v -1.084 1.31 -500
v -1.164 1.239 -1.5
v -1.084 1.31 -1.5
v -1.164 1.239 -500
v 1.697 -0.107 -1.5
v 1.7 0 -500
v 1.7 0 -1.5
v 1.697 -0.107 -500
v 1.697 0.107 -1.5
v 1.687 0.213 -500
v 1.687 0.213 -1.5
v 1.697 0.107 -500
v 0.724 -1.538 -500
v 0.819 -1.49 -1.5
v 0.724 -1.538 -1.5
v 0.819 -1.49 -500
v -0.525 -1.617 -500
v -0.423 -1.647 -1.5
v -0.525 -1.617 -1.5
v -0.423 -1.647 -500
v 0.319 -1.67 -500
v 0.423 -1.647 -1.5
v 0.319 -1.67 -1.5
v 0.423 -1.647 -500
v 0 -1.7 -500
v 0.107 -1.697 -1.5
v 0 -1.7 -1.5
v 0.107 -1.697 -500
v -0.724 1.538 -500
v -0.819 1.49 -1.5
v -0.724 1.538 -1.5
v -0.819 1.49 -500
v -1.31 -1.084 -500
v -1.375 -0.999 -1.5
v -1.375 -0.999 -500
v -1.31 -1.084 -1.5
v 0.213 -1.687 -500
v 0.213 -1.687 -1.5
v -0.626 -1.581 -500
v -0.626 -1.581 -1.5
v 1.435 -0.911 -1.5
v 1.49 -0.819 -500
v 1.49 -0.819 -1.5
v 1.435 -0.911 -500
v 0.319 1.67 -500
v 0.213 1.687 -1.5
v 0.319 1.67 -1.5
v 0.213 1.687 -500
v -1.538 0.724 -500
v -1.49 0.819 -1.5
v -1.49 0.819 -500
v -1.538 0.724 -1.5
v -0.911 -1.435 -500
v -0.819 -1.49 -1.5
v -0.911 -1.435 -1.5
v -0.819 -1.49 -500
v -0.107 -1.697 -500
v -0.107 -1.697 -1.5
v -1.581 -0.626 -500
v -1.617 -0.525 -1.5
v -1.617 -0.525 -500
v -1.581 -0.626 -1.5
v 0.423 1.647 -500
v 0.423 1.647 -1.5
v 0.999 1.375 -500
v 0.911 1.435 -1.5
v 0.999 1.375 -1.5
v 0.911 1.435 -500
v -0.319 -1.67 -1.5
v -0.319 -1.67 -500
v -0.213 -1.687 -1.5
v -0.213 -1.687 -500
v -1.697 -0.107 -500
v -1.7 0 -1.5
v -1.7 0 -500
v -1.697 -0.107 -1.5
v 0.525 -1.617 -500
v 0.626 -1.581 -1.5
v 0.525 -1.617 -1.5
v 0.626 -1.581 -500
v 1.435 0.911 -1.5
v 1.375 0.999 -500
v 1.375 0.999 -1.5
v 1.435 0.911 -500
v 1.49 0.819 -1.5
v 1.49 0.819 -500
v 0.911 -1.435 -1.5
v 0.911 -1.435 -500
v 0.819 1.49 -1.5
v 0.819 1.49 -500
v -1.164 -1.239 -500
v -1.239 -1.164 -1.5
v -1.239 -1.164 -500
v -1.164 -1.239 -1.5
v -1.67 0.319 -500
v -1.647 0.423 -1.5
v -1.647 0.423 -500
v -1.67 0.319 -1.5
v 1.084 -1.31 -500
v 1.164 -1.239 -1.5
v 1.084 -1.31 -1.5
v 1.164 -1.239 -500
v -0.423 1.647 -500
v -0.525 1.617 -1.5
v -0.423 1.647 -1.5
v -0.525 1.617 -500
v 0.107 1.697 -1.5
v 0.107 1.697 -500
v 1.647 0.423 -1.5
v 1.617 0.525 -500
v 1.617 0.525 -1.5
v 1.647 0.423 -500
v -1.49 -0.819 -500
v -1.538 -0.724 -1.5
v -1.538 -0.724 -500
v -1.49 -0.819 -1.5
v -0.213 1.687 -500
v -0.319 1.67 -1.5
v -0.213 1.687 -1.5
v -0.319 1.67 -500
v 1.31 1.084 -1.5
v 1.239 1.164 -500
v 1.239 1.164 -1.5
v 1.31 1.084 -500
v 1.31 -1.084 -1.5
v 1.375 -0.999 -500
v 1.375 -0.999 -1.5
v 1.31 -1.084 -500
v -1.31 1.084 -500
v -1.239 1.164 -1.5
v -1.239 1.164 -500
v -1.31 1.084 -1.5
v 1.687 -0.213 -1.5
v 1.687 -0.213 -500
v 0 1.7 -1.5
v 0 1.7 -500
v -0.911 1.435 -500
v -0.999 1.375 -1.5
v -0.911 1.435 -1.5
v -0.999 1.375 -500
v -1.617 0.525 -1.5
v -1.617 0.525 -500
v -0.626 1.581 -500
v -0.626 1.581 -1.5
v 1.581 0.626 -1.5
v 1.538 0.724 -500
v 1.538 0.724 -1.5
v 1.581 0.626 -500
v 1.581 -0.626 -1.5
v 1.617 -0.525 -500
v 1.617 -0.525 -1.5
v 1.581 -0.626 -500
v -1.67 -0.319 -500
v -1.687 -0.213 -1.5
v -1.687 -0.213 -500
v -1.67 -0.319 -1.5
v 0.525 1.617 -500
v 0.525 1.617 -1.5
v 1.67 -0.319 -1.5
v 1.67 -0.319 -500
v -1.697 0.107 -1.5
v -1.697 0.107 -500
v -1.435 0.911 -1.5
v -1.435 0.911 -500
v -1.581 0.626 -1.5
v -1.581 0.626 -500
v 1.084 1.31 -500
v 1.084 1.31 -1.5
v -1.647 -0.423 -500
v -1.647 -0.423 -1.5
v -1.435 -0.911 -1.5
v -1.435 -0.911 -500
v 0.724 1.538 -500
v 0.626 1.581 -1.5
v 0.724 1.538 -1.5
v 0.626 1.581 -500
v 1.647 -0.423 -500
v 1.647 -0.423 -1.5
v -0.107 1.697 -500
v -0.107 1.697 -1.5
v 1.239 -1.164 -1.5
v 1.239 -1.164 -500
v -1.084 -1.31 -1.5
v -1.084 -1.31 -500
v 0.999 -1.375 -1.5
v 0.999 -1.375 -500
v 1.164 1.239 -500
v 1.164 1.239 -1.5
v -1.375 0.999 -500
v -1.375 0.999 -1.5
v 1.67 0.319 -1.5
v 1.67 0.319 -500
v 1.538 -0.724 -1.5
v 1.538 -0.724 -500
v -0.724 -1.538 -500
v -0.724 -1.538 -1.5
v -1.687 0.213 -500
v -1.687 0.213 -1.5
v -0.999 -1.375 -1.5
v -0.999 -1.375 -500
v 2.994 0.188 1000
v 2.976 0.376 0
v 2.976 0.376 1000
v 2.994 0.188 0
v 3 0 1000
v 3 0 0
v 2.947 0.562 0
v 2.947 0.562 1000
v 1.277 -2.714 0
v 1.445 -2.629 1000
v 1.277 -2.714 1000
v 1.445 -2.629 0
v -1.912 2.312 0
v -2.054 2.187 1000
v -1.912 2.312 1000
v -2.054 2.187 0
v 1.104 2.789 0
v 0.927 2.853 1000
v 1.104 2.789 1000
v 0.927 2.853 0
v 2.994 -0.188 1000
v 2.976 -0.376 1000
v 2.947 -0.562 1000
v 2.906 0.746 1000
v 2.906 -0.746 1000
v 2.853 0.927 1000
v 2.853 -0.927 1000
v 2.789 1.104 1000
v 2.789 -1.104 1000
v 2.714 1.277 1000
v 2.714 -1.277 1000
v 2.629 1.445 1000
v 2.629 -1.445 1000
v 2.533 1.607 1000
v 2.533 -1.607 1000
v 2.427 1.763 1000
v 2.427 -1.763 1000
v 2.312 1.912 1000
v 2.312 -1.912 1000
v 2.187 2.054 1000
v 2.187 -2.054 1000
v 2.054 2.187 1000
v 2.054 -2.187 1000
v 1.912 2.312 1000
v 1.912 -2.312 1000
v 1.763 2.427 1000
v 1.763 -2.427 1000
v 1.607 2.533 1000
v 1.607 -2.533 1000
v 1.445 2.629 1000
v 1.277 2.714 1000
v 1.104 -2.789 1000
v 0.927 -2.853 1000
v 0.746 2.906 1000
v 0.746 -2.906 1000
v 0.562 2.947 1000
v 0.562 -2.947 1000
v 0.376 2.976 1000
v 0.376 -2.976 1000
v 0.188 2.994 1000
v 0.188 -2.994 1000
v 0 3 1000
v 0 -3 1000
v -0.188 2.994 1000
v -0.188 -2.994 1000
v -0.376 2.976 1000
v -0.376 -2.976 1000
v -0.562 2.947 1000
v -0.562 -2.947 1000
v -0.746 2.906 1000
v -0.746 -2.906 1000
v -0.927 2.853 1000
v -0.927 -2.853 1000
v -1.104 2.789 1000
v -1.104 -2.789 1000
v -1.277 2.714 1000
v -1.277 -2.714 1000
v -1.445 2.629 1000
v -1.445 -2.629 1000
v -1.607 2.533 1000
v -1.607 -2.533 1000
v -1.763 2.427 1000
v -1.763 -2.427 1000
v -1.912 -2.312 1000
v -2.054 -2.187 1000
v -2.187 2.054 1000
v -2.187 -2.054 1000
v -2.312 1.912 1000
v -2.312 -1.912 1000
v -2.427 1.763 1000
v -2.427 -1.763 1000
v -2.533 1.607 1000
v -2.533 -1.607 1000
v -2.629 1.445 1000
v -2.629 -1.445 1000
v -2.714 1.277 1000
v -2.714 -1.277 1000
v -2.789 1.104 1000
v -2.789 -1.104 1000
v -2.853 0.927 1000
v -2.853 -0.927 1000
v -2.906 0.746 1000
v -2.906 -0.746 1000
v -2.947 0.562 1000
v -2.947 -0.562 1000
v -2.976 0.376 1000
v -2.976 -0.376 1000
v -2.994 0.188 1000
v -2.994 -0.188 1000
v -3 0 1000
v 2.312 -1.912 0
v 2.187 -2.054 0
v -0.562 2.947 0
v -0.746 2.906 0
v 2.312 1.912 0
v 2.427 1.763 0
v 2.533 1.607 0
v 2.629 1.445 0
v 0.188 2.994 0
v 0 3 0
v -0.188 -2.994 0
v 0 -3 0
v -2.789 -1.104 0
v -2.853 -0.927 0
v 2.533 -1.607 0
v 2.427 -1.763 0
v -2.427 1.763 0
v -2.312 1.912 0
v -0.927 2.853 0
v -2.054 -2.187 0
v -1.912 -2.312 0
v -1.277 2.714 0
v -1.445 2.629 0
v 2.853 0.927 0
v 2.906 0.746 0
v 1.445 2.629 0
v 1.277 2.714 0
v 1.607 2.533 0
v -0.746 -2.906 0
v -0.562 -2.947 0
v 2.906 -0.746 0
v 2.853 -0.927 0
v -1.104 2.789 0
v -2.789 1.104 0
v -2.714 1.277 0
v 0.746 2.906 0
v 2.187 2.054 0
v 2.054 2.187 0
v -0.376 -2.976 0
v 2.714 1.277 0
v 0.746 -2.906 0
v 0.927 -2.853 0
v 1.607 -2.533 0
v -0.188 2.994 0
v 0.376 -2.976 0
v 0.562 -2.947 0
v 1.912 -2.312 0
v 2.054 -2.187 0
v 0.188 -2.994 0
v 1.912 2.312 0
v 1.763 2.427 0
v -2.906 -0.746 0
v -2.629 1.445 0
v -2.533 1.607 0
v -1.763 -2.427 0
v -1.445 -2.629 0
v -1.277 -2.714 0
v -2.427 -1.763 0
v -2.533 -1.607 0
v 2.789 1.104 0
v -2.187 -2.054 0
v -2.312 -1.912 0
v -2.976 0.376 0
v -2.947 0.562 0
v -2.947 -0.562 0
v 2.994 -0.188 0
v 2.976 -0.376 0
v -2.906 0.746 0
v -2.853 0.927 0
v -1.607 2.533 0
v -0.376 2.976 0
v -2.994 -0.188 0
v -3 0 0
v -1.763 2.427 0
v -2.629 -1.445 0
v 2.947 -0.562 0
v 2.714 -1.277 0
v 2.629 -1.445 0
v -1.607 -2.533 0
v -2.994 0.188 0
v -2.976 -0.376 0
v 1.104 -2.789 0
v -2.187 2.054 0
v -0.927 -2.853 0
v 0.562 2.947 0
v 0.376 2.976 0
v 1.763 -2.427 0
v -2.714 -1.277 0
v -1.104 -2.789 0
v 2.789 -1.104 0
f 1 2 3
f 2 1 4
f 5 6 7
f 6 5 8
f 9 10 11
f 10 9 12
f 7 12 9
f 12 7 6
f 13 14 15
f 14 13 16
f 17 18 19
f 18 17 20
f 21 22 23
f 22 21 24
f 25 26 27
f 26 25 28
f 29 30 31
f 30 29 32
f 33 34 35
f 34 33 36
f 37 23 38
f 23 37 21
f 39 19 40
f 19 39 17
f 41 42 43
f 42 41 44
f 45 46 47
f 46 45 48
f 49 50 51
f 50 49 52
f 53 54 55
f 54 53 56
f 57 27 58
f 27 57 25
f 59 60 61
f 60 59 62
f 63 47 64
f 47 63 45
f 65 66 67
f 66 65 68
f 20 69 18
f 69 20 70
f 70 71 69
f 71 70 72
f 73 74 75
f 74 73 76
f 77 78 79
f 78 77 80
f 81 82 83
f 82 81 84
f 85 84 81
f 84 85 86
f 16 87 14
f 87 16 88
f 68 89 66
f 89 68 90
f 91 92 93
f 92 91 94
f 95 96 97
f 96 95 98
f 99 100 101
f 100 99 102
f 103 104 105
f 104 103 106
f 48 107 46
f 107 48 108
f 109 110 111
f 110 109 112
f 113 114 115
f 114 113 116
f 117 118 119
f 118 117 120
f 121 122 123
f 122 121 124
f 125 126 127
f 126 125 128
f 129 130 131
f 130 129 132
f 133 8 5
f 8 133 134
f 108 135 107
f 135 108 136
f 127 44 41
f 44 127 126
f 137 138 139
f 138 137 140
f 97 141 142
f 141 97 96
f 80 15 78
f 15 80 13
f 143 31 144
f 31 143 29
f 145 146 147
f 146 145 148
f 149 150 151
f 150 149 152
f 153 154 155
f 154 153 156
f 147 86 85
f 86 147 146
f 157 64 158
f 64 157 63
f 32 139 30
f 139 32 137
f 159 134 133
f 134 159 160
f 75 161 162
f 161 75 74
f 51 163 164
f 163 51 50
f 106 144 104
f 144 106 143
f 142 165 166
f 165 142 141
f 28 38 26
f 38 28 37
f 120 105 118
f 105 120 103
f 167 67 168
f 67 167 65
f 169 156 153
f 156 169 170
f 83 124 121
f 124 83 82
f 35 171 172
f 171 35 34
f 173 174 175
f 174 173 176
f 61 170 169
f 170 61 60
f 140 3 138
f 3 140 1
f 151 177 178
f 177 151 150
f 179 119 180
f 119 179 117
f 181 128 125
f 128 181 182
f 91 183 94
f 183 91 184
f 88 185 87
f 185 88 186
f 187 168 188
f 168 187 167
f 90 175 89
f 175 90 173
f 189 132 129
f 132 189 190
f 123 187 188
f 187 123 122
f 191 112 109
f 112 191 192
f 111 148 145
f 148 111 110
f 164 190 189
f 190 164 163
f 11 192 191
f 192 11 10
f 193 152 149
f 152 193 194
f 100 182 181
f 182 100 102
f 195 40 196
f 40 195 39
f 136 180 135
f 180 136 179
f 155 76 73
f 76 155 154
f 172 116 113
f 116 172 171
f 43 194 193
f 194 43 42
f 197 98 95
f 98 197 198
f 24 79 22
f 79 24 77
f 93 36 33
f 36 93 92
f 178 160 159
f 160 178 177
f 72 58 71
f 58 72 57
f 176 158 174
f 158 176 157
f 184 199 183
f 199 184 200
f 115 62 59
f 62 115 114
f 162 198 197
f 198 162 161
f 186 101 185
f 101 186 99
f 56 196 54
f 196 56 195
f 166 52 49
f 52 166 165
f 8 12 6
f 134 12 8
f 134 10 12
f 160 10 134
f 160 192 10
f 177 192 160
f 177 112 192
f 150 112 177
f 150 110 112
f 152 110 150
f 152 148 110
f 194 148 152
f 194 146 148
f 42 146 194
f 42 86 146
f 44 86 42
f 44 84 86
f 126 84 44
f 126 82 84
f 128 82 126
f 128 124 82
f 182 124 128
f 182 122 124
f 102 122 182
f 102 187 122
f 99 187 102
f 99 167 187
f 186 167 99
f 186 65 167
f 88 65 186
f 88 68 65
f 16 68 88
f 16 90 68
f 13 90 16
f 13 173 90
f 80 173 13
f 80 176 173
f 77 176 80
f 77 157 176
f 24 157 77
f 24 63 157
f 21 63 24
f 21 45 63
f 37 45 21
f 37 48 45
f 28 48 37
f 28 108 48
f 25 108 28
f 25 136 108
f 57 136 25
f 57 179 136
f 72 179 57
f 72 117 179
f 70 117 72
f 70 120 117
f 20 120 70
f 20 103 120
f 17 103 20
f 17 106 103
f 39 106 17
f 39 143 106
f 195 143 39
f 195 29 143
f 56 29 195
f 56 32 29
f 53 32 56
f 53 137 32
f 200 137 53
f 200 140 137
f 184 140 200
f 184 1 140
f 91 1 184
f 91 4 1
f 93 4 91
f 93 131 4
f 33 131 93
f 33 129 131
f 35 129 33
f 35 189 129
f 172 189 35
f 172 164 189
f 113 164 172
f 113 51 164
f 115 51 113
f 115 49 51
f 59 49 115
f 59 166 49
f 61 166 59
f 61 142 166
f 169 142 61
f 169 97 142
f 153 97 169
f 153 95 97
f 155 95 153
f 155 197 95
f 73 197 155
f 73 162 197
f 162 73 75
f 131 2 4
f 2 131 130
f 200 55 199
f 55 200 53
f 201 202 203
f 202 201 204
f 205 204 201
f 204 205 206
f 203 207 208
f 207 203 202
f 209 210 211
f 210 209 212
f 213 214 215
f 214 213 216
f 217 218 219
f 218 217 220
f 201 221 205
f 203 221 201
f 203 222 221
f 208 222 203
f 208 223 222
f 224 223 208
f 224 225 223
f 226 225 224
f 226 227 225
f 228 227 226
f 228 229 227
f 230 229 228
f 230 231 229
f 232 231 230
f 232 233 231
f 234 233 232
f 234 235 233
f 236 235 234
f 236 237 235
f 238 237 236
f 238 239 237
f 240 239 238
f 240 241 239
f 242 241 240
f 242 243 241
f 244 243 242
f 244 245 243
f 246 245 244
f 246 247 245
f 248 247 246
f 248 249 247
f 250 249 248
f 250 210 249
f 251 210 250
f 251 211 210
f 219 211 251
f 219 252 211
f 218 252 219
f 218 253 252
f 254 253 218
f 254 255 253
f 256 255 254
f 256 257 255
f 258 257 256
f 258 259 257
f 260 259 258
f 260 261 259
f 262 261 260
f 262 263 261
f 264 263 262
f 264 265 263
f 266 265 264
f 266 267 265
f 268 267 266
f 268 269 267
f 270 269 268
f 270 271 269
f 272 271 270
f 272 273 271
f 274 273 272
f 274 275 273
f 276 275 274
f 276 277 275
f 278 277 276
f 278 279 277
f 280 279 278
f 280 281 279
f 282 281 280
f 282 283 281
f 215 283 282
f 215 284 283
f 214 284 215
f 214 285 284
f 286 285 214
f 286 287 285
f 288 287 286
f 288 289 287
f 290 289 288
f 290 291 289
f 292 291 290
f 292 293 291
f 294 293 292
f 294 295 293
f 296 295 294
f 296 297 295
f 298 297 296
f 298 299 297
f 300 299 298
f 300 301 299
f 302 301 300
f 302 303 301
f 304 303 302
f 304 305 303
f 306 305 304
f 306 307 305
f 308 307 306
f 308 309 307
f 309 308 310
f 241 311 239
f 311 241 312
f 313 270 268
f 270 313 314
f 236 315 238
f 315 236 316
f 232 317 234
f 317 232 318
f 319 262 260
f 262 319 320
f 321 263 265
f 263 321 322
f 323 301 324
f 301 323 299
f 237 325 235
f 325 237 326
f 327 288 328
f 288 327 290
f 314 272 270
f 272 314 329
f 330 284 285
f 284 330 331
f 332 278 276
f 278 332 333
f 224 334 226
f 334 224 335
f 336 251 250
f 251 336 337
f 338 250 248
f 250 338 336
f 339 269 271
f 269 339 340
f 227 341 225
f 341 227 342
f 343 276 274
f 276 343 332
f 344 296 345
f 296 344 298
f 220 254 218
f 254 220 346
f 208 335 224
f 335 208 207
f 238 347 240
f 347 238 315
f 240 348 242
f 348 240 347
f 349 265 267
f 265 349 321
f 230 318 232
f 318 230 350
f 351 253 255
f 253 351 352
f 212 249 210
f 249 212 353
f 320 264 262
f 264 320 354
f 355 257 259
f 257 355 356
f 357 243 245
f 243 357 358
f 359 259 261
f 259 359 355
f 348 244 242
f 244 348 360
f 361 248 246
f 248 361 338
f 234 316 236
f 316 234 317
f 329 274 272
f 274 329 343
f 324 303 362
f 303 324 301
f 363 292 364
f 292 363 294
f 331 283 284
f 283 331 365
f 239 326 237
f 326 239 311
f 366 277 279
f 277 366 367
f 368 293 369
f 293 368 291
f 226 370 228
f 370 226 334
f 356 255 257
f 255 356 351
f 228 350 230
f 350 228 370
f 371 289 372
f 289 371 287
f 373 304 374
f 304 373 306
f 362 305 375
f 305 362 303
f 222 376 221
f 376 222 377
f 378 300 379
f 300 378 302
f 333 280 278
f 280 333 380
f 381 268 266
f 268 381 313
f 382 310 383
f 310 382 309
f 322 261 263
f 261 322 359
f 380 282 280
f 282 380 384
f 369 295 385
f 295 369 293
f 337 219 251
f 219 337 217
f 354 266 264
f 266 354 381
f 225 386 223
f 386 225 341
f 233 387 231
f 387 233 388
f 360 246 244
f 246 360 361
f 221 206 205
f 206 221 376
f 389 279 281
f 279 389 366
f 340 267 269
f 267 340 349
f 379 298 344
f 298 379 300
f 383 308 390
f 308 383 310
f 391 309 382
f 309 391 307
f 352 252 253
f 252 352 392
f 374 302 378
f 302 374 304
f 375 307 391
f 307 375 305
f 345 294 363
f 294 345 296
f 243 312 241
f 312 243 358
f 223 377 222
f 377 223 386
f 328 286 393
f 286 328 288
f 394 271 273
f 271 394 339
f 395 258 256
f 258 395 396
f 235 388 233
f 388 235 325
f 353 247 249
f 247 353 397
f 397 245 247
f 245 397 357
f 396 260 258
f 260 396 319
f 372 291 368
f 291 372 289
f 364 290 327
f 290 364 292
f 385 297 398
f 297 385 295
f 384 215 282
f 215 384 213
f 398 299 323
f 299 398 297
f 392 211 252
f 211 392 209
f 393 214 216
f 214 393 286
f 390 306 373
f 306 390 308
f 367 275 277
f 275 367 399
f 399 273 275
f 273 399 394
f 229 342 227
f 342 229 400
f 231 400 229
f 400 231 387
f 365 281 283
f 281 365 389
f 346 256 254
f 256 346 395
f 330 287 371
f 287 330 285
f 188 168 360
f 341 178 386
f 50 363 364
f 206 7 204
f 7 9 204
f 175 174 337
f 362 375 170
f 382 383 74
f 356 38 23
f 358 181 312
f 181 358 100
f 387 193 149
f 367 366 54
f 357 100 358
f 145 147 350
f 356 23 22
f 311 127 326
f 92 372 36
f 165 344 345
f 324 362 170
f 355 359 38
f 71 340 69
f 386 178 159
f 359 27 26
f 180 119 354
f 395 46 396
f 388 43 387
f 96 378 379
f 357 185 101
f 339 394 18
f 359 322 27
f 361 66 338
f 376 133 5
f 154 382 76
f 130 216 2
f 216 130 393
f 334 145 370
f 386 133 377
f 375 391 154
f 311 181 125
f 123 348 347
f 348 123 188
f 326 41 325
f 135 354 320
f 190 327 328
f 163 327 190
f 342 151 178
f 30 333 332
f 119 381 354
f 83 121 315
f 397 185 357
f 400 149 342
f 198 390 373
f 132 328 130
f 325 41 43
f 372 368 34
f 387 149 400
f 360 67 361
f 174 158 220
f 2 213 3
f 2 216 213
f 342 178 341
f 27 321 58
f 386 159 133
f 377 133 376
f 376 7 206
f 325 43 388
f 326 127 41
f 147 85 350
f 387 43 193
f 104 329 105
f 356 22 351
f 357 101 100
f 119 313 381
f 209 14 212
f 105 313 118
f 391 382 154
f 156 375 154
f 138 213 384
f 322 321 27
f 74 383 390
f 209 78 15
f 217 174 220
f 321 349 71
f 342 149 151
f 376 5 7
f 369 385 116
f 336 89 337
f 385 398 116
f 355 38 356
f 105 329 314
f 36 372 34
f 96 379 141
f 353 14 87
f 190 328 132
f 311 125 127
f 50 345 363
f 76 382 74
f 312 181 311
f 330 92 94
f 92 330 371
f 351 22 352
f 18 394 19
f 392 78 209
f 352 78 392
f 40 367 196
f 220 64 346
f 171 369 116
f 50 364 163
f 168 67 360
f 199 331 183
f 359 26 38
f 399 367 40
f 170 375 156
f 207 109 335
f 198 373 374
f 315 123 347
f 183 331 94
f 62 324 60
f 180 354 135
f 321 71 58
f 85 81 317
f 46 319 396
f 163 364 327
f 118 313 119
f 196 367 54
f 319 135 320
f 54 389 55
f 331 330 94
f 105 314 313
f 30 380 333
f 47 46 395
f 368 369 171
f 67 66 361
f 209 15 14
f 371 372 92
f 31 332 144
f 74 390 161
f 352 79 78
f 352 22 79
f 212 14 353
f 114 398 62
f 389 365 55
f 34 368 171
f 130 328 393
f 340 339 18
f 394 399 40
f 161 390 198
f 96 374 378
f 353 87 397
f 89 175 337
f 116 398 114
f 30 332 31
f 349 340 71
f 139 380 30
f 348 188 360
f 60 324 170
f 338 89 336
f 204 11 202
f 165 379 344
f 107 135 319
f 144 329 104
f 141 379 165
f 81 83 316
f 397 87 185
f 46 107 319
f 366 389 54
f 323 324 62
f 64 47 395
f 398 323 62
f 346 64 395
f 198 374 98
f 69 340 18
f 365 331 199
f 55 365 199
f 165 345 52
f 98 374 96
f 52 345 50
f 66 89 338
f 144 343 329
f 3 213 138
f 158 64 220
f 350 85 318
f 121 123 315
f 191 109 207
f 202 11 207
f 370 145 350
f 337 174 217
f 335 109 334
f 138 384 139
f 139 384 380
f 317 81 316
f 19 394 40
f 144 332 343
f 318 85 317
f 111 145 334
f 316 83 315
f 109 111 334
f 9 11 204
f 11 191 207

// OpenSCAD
module SchlitzschraubenNegativ(innerDiameter = 3.4, outerDiameter = 6) {
    // Nullpunkt ist am Übergang von Gewinde zu Kopf
    cylinder(h=1000, d=innerDiameter, center=true);
    cylinder(h=1000, d=outerDiameter);
    translate([0,0,-1.5])cylinder(h=1.5, d1=innerDiameter, d2=outerDiameter);
}

$fn=100;
SchlitzschraubenNegativ();
